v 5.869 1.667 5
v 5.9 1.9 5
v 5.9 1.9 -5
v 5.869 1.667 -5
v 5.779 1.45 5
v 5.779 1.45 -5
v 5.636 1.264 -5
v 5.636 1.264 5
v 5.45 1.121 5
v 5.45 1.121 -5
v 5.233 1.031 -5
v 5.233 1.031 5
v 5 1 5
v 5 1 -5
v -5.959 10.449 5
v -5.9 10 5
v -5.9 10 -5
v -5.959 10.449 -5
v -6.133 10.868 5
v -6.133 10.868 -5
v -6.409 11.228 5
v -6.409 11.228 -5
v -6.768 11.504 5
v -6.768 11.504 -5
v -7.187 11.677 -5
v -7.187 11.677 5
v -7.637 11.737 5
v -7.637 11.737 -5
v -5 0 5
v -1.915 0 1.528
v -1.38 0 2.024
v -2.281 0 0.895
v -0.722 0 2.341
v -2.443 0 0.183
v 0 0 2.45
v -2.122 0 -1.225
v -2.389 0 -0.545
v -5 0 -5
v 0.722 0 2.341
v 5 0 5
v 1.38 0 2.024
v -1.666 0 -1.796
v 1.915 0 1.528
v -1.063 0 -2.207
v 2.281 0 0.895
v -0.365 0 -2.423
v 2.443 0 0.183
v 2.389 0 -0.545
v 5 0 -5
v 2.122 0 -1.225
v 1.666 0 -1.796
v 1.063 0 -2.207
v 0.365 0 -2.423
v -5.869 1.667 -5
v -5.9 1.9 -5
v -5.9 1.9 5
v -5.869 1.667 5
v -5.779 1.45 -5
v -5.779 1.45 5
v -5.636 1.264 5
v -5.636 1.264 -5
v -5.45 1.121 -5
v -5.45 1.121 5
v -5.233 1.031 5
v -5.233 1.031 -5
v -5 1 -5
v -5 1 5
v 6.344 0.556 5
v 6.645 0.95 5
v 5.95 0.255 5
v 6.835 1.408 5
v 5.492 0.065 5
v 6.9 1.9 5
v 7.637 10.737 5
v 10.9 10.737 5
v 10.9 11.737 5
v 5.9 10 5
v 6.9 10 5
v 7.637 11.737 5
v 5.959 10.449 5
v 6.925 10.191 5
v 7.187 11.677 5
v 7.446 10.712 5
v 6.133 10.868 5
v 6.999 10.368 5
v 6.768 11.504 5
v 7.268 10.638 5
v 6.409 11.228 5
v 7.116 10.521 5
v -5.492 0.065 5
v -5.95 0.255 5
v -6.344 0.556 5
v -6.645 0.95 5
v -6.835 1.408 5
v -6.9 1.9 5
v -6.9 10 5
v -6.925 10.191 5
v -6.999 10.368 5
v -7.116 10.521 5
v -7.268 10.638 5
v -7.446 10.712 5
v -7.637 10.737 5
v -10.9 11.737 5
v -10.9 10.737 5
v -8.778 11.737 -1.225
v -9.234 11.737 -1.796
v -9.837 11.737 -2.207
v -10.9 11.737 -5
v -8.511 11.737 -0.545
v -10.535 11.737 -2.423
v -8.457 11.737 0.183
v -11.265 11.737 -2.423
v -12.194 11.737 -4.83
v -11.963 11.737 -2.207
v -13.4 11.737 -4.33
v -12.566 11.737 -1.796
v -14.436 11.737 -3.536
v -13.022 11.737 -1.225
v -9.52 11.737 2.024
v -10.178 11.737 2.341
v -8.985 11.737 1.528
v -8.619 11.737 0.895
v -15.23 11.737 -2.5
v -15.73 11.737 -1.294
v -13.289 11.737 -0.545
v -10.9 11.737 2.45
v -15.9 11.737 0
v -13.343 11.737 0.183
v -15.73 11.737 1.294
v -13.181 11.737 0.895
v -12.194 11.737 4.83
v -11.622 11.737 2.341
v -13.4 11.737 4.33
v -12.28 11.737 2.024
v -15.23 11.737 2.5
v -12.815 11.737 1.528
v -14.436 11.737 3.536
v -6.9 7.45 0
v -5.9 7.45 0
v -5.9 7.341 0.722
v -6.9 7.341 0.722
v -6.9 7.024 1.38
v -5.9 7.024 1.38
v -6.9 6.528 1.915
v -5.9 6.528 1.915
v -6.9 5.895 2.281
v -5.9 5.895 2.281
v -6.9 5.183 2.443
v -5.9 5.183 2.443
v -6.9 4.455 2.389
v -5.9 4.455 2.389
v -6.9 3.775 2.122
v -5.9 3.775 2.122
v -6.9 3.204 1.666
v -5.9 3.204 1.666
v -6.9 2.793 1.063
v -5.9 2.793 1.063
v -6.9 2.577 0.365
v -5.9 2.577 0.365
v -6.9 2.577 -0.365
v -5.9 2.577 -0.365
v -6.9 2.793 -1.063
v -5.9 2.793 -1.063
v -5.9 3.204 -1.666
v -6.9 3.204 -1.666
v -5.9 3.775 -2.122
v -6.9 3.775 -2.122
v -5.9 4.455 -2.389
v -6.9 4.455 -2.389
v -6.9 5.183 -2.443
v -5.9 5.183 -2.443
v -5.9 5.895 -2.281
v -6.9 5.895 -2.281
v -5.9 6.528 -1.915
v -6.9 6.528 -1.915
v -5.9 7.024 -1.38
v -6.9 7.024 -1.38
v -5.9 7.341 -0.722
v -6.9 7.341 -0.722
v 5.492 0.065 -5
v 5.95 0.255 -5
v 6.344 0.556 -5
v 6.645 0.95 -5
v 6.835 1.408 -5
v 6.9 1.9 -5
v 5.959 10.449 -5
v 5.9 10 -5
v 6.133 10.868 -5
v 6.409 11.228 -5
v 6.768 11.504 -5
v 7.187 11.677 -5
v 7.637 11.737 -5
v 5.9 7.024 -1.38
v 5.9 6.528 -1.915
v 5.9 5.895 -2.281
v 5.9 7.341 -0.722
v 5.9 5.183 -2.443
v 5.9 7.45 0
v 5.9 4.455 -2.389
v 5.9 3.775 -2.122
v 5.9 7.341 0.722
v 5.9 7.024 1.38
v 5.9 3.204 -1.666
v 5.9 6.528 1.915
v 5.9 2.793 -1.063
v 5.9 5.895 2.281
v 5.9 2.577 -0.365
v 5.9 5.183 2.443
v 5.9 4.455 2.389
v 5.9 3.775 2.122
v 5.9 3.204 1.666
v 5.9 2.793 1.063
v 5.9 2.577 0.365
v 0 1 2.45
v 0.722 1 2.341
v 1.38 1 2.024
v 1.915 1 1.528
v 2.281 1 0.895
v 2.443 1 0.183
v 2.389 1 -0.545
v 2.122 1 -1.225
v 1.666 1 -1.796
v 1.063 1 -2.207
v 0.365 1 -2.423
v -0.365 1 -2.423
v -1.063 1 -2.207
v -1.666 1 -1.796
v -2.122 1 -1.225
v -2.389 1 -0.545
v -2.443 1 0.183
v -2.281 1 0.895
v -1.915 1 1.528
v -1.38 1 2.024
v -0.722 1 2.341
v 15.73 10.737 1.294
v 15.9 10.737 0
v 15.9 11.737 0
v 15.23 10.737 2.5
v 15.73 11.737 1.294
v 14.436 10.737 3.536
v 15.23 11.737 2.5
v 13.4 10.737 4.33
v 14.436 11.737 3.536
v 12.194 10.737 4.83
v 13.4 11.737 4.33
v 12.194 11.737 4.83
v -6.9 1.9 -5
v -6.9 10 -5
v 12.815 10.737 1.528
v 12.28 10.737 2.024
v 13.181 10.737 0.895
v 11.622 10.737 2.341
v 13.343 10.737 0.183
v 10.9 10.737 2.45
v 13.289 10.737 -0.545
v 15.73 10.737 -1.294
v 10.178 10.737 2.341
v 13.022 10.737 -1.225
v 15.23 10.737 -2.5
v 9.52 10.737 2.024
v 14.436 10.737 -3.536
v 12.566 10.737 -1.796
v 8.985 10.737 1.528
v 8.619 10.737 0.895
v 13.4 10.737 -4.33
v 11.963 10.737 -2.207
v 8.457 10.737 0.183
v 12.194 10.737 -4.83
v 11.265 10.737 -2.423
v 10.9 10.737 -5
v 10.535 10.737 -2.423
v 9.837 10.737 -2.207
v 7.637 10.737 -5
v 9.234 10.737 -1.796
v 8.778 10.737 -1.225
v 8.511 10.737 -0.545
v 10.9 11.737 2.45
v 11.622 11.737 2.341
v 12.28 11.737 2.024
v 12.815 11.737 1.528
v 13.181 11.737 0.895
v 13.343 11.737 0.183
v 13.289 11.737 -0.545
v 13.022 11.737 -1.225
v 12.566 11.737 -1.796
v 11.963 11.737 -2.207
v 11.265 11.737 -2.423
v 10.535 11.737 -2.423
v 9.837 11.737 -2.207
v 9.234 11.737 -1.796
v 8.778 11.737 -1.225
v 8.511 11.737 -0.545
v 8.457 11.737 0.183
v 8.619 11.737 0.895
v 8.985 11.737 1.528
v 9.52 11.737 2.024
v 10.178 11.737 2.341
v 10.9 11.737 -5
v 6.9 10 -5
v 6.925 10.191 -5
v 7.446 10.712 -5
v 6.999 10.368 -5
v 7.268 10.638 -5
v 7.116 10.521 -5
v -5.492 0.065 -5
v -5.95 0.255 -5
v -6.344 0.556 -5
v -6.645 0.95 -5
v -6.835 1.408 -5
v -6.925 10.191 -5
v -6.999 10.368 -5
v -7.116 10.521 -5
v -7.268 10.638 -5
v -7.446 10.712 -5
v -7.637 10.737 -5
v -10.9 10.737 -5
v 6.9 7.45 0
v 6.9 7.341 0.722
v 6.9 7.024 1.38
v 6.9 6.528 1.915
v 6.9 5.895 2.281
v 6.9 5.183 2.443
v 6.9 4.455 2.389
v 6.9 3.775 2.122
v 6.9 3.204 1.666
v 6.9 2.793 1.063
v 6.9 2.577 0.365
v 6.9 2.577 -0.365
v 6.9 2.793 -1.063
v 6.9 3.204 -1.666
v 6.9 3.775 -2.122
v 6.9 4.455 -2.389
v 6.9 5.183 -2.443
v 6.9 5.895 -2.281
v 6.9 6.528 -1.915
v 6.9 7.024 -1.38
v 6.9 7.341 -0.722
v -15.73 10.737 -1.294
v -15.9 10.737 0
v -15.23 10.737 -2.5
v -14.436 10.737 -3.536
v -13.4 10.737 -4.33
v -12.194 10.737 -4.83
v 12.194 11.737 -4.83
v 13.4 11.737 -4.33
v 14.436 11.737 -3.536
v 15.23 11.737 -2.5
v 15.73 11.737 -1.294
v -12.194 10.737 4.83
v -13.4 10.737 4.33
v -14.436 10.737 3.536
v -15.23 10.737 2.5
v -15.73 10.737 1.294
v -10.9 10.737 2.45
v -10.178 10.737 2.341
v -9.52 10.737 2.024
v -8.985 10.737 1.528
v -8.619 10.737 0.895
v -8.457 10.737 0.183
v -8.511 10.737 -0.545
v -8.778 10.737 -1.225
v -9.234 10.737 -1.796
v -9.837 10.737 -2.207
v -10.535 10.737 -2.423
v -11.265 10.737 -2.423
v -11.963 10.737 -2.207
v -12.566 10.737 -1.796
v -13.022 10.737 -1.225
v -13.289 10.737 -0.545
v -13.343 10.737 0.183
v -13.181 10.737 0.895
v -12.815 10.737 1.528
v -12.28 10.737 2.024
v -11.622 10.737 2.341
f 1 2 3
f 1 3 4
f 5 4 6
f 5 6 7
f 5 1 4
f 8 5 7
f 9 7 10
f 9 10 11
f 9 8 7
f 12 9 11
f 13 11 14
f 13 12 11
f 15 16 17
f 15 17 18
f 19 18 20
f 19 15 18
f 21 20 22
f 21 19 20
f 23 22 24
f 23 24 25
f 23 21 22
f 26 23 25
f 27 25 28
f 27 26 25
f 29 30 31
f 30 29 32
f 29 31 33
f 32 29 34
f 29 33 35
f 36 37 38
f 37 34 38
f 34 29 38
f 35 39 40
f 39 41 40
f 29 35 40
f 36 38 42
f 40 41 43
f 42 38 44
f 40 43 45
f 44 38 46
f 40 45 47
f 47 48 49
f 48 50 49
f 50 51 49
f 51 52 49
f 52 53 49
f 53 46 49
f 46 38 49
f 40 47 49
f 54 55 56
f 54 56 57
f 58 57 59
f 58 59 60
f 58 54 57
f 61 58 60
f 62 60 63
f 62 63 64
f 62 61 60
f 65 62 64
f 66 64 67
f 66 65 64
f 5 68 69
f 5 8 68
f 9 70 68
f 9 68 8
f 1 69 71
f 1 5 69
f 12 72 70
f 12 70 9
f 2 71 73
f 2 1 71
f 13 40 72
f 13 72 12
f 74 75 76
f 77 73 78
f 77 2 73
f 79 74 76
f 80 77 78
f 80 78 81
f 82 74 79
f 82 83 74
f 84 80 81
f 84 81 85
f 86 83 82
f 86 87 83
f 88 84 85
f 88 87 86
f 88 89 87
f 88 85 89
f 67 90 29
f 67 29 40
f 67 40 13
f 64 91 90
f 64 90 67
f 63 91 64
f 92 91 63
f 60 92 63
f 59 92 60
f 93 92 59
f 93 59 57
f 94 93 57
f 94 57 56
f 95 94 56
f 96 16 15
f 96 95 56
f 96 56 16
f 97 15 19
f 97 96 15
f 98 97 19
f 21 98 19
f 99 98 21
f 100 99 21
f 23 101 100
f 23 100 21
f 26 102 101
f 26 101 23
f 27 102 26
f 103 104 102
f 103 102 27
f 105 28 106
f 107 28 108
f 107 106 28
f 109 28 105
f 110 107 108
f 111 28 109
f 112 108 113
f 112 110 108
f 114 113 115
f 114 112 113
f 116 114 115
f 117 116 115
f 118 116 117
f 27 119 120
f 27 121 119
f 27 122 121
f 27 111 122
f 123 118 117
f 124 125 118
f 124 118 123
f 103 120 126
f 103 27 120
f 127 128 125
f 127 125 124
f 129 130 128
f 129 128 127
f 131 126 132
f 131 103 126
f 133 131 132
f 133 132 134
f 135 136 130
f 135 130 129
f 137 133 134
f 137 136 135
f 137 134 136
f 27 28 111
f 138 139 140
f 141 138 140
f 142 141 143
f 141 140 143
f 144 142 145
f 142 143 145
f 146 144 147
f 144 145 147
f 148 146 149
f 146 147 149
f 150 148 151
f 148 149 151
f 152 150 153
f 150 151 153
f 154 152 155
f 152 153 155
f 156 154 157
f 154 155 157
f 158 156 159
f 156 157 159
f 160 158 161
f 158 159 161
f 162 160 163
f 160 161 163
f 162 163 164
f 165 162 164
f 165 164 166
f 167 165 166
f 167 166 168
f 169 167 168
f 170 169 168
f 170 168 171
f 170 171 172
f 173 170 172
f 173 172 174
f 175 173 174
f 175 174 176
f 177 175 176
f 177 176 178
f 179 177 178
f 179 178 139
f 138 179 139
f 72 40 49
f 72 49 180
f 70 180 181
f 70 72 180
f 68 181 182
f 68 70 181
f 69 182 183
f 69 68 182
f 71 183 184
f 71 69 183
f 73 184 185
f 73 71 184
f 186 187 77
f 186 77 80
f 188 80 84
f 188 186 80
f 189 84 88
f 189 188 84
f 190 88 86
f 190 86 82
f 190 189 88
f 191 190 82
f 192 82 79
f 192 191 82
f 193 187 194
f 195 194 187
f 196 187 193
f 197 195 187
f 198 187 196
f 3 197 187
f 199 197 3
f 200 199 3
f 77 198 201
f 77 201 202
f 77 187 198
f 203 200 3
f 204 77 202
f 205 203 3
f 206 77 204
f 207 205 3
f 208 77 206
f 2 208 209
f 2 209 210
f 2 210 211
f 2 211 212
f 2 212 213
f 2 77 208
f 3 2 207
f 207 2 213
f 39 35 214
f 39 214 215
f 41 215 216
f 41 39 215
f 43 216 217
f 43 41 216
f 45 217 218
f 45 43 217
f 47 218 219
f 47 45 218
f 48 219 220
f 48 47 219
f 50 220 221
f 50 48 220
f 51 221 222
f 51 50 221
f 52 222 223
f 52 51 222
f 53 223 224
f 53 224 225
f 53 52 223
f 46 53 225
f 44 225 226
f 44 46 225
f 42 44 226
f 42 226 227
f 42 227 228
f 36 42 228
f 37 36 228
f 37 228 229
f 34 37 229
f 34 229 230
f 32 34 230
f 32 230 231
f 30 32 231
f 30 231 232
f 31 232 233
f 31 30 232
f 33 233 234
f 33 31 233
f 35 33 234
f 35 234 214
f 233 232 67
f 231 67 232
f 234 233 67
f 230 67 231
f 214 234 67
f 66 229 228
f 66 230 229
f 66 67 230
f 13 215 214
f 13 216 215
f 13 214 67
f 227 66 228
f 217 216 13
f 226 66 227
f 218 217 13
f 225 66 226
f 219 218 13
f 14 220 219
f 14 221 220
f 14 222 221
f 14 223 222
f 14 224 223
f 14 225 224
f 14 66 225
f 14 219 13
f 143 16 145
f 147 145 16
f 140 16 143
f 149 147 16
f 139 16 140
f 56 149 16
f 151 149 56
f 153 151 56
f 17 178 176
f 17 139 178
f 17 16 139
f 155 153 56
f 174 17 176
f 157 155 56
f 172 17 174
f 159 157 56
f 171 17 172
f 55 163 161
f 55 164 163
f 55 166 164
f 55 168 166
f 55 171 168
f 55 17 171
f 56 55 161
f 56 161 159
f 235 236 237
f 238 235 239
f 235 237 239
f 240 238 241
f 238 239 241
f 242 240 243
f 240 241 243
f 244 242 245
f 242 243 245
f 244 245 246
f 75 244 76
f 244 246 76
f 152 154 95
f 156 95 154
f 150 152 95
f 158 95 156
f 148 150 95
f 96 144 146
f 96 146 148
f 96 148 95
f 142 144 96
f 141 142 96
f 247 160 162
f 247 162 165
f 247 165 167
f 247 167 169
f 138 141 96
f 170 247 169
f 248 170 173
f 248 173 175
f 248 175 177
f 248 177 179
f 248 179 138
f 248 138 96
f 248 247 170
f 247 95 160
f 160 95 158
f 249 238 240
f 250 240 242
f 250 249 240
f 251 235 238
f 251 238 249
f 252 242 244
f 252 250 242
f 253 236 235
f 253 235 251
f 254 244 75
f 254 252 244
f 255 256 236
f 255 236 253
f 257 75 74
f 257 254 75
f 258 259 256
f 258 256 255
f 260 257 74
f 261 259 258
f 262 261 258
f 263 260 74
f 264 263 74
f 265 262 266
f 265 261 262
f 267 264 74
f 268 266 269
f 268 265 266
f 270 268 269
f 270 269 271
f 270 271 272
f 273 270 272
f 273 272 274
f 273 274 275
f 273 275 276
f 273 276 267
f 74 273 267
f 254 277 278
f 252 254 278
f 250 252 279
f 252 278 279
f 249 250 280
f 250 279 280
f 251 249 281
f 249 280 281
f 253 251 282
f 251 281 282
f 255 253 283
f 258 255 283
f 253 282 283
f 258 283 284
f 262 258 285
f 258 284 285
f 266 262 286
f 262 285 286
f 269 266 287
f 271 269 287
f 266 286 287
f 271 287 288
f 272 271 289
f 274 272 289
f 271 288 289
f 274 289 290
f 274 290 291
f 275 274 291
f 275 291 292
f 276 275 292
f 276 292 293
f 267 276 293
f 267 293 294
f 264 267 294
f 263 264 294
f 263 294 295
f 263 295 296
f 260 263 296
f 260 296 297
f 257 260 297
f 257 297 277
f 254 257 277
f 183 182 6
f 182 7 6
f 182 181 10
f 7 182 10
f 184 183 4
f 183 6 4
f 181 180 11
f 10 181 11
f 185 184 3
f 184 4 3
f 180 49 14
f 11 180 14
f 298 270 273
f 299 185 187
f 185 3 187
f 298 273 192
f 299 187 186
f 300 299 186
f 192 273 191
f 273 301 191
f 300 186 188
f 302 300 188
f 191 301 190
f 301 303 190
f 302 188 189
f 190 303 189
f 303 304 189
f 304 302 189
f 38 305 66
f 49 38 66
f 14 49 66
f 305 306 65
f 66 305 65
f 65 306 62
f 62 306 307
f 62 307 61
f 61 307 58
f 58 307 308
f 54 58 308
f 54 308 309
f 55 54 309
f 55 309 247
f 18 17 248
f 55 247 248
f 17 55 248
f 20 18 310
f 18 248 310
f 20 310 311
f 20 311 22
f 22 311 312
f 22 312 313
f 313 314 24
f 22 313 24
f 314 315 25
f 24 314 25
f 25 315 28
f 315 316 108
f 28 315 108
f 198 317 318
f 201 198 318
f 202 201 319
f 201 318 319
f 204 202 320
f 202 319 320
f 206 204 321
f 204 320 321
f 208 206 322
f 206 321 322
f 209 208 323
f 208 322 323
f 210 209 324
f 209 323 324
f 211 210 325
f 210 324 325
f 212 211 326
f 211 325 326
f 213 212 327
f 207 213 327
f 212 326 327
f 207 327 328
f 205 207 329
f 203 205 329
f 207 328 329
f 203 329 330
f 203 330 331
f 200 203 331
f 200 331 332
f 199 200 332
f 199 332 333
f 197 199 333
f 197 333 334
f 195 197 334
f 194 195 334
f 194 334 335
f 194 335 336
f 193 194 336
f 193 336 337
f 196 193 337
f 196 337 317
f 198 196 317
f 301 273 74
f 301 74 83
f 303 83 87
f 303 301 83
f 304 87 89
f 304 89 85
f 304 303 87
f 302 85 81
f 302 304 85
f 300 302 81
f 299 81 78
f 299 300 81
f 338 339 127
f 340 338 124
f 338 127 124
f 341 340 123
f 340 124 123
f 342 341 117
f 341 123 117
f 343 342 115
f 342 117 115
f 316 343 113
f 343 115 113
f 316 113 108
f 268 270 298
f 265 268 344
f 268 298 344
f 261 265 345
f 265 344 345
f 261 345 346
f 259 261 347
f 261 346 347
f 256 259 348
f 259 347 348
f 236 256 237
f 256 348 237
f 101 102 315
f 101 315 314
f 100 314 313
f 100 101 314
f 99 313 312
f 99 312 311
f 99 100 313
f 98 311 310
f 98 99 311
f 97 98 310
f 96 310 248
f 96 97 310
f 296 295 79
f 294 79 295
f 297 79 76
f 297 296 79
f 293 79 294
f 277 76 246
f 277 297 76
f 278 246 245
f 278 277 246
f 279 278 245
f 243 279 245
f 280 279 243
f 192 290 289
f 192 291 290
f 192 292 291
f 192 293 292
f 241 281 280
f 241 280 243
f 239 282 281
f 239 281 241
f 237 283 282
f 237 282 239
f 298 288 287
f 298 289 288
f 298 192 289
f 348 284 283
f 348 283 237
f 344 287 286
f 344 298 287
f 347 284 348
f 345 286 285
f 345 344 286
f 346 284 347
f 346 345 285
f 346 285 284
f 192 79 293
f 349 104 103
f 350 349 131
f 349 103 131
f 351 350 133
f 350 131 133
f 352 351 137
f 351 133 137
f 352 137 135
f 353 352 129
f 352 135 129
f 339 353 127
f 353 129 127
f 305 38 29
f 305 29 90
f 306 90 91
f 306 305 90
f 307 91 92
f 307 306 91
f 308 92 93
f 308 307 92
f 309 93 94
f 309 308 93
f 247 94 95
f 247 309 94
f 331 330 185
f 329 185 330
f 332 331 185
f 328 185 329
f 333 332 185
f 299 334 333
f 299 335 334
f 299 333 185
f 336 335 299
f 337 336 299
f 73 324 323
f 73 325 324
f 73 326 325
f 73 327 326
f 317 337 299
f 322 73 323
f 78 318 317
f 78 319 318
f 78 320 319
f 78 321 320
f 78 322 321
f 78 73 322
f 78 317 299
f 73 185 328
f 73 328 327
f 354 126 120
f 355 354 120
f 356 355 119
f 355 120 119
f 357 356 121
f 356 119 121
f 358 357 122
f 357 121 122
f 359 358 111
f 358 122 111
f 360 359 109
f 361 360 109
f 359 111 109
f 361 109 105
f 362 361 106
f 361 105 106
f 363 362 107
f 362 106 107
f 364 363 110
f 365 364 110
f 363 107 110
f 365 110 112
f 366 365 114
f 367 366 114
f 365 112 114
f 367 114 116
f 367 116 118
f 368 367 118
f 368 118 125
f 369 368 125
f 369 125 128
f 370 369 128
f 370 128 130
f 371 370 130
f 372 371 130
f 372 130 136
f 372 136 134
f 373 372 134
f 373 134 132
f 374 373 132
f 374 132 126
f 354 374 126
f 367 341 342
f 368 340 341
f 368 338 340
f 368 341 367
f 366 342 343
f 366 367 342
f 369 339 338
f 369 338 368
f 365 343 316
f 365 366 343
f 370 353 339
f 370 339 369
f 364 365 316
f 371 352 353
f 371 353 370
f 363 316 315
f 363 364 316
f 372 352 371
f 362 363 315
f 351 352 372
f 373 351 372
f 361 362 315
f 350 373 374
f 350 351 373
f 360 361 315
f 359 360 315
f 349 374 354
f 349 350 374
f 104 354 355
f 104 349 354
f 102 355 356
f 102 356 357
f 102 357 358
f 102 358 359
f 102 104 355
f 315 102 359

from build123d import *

# Parameters (mm, degrees)
SKETCH1_W               = 10
SKETCH1_H               = 10
SKETCH1_R               = 2.45
BASE_FLANGE1_DEPTH      = 1
EDGE_FLANGE1_DEPTH      = 10
EDGE_FLANGE1_BEND_DEPTH = 10
SKETCH12_R              = 2.45
CUT_EXTRUDE1_DEPTH      = 18.760630619
EDGE_FLANGE2_DEPTH      = 10
EDGE_FLANGE2_BEND_DEPTH = 10
SKETCH19_R              = 2.45
CUT_EXTRUDE2_DEPTH      = 21.385234351
CUT_EXTRUDE3_DEPTH      = 21.385234351


# Sheet-metal steps are written as plain solids
with BuildPart() as part:
    # Sketch1 → Base-Flange1 (new body)
    with BuildSketch(Plane(origin=(0, 0, 0), x_dir=(1, 0, 0), z_dir=(0, 1, 0))):
        Rectangle(SKETCH1_W, SKETCH1_H)
        with Locations(Location((0, 0, 0), (0, 0, 270))):
            Circle(SKETCH1_R, mode=Mode.SUBTRACT)
    extrude(amount=BASE_FLANGE1_DEPTH)

    # Edge-Flange1 section (across the edge) → Edge-Flange1 (add)
    with BuildSketch(Plane(origin=(-5.9, 1, -5), x_dir=(1, 0, 0), z_dir=(0, 0, 1))):
        with BuildLine():
            Line((-1, 0.9), (-1, 9))
            Line((-1, 9), (0, 9))
            Line((0, 9), (0, 0.9))
            ThreePointArc((0, 0.9), (0.263603897, 0.263603897), (0.9, 0))
            Line((0.9, 0), (0.9, -1))
            ThreePointArc((0.9, -1), (-0.443502884, -0.443502884), (-1, 0.9))
        make_face()
    extrude(amount=EDGE_FLANGE1_DEPTH)

    # Edge-Flange1 section 2 (across the edge) → Edge-Flange1 bend (add)
    with BuildSketch(Plane(origin=(5.9, 1, 5), x_dir=(-1, 0, 0), z_dir=(0, 0, -1))):
        with BuildLine():
            Line((-1, 0.9), (-1, 9))
            Line((-1, 9), (0, 9))
            Line((0, 9), (0, 0.9))
            ThreePointArc((0, 0.9), (0.263603897, 0.263603897), (0.9, 0))
            Line((0.9, 0), (0.9, -1))
            ThreePointArc((0.9, -1), (-0.443502884, -0.443502884), (-1, 0.9))
        make_face()
    extrude(amount=EDGE_FLANGE1_BEND_DEPTH)

    # Sketch12 → Cut-Extrude1 (cut, through all)
    with BuildSketch(Plane(origin=(6.9, 0, 0), x_dir=(0, 0, -1), z_dir=(1, 0, 0))):
        with Locations(Location((0, 5, 0), (0, 0, 90))):
            Circle(SKETCH12_R)
    extrude(amount=-CUT_EXTRUDE1_DEPTH, mode=Mode.SUBTRACT)

    # Edge-Flange2 section (across the edge) → Edge-Flange2 (add)
    with BuildSketch(Plane(origin=(6.9, 10.7366, -5), x_dir=(0, -1, 0), z_dir=(0, 0, 1))):
        with BuildLine():
            Line((-1, 0.7366), (-1, 9))
            Line((-1, 9), (0, 9))
            Line((0, 9), (0, 0.7366))
            ThreePointArc((0, 0.7366), (0.215745145, 0.215745145), (0.7366, 0))
            Line((0.7366, 0), (0.7366, -1))
            ThreePointArc((0.7366, -1), (-0.491361636, -0.491361636), (-1, 0.7366))
        make_face()
    extrude(amount=EDGE_FLANGE2_DEPTH)

    # Edge-Flange2 section 2 (across the edge) → Edge-Flange2 bend (add)
    with BuildSketch(Plane(origin=(-6.9, 10.7366, 5), x_dir=(0, -1, 0), z_dir=(0, 0, -1))):
        with BuildLine():
            Line((-1, 0.7366), (-1, 9))
            Line((-1, 9), (0, 9))
            Line((0, 9), (0, 0.7366))
            ThreePointArc((0, 0.7366), (0.215745145, 0.215745145), (0.7366, 0))
            Line((0.7366, 0), (0.7366, -1))
            ThreePointArc((0.7366, -1), (-0.491361636, -0.491361636), (-1, 0.7366))
        make_face()
    extrude(amount=EDGE_FLANGE2_BEND_DEPTH)

    # Sketch19 → Cut-Extrude2 (cut, through all)
    with BuildSketch(Plane(origin=(0, 11.7366, 0), x_dir=(1, 0, 0), z_dir=(0, 1, 0))):
        with Locations(Location((-10.9, 0, 0), (0, 0, 270))):
            Circle(SKETCH19_R)
        with Locations(Location((10.9, 0, 0), (0, 0, 270))):
            Circle(SKETCH19_R)
    extrude(amount=-CUT_EXTRUDE2_DEPTH, mode=Mode.SUBTRACT)

    # Sketch20 → Cut-Extrude3 (cut, through all)
    with BuildSketch(Plane(origin=(0, 11.7366, 0), x_dir=(1, 0, 0), z_dir=(0, 1, 0))):
        with BuildLine():
            Line((15.9, -5), (15.9, -3.1e-08))
            ThreePointArc((15.9, -3.1e-08), (14.435533895, -3.535533917), (10.9, -5))
            Line((10.9, -5), (15.9, -5))
        make_face()
        with BuildLine():
            Line((15.9, 5), (10.9, 5))
            ThreePointArc((10.9, 5), (14.435533917, 3.535533895), (15.9, -3.1e-08))
            Line((15.9, -3.1e-08), (15.9, 5))
        make_face()
        with BuildLine():
            ThreePointArc((-10.9, -5), (-14.435533906, -3.535533906), (-15.9, 0))
            Line((-15.9, 0), (-15.9, -5))
            Line((-15.9, -5), (-10.9, -5))
        make_face()
        with BuildLine():
            ThreePointArc((-15.9, 0), (-14.435533906, 3.535533906), (-10.9, 5))
            Line((-10.9, 5), (-15.9, 5))
            Line((-15.9, 5), (-15.9, 0))
        make_face()
    extrude(amount=-CUT_EXTRUDE3_DEPTH, mode=Mode.SUBTRACT)


solid = part.part
